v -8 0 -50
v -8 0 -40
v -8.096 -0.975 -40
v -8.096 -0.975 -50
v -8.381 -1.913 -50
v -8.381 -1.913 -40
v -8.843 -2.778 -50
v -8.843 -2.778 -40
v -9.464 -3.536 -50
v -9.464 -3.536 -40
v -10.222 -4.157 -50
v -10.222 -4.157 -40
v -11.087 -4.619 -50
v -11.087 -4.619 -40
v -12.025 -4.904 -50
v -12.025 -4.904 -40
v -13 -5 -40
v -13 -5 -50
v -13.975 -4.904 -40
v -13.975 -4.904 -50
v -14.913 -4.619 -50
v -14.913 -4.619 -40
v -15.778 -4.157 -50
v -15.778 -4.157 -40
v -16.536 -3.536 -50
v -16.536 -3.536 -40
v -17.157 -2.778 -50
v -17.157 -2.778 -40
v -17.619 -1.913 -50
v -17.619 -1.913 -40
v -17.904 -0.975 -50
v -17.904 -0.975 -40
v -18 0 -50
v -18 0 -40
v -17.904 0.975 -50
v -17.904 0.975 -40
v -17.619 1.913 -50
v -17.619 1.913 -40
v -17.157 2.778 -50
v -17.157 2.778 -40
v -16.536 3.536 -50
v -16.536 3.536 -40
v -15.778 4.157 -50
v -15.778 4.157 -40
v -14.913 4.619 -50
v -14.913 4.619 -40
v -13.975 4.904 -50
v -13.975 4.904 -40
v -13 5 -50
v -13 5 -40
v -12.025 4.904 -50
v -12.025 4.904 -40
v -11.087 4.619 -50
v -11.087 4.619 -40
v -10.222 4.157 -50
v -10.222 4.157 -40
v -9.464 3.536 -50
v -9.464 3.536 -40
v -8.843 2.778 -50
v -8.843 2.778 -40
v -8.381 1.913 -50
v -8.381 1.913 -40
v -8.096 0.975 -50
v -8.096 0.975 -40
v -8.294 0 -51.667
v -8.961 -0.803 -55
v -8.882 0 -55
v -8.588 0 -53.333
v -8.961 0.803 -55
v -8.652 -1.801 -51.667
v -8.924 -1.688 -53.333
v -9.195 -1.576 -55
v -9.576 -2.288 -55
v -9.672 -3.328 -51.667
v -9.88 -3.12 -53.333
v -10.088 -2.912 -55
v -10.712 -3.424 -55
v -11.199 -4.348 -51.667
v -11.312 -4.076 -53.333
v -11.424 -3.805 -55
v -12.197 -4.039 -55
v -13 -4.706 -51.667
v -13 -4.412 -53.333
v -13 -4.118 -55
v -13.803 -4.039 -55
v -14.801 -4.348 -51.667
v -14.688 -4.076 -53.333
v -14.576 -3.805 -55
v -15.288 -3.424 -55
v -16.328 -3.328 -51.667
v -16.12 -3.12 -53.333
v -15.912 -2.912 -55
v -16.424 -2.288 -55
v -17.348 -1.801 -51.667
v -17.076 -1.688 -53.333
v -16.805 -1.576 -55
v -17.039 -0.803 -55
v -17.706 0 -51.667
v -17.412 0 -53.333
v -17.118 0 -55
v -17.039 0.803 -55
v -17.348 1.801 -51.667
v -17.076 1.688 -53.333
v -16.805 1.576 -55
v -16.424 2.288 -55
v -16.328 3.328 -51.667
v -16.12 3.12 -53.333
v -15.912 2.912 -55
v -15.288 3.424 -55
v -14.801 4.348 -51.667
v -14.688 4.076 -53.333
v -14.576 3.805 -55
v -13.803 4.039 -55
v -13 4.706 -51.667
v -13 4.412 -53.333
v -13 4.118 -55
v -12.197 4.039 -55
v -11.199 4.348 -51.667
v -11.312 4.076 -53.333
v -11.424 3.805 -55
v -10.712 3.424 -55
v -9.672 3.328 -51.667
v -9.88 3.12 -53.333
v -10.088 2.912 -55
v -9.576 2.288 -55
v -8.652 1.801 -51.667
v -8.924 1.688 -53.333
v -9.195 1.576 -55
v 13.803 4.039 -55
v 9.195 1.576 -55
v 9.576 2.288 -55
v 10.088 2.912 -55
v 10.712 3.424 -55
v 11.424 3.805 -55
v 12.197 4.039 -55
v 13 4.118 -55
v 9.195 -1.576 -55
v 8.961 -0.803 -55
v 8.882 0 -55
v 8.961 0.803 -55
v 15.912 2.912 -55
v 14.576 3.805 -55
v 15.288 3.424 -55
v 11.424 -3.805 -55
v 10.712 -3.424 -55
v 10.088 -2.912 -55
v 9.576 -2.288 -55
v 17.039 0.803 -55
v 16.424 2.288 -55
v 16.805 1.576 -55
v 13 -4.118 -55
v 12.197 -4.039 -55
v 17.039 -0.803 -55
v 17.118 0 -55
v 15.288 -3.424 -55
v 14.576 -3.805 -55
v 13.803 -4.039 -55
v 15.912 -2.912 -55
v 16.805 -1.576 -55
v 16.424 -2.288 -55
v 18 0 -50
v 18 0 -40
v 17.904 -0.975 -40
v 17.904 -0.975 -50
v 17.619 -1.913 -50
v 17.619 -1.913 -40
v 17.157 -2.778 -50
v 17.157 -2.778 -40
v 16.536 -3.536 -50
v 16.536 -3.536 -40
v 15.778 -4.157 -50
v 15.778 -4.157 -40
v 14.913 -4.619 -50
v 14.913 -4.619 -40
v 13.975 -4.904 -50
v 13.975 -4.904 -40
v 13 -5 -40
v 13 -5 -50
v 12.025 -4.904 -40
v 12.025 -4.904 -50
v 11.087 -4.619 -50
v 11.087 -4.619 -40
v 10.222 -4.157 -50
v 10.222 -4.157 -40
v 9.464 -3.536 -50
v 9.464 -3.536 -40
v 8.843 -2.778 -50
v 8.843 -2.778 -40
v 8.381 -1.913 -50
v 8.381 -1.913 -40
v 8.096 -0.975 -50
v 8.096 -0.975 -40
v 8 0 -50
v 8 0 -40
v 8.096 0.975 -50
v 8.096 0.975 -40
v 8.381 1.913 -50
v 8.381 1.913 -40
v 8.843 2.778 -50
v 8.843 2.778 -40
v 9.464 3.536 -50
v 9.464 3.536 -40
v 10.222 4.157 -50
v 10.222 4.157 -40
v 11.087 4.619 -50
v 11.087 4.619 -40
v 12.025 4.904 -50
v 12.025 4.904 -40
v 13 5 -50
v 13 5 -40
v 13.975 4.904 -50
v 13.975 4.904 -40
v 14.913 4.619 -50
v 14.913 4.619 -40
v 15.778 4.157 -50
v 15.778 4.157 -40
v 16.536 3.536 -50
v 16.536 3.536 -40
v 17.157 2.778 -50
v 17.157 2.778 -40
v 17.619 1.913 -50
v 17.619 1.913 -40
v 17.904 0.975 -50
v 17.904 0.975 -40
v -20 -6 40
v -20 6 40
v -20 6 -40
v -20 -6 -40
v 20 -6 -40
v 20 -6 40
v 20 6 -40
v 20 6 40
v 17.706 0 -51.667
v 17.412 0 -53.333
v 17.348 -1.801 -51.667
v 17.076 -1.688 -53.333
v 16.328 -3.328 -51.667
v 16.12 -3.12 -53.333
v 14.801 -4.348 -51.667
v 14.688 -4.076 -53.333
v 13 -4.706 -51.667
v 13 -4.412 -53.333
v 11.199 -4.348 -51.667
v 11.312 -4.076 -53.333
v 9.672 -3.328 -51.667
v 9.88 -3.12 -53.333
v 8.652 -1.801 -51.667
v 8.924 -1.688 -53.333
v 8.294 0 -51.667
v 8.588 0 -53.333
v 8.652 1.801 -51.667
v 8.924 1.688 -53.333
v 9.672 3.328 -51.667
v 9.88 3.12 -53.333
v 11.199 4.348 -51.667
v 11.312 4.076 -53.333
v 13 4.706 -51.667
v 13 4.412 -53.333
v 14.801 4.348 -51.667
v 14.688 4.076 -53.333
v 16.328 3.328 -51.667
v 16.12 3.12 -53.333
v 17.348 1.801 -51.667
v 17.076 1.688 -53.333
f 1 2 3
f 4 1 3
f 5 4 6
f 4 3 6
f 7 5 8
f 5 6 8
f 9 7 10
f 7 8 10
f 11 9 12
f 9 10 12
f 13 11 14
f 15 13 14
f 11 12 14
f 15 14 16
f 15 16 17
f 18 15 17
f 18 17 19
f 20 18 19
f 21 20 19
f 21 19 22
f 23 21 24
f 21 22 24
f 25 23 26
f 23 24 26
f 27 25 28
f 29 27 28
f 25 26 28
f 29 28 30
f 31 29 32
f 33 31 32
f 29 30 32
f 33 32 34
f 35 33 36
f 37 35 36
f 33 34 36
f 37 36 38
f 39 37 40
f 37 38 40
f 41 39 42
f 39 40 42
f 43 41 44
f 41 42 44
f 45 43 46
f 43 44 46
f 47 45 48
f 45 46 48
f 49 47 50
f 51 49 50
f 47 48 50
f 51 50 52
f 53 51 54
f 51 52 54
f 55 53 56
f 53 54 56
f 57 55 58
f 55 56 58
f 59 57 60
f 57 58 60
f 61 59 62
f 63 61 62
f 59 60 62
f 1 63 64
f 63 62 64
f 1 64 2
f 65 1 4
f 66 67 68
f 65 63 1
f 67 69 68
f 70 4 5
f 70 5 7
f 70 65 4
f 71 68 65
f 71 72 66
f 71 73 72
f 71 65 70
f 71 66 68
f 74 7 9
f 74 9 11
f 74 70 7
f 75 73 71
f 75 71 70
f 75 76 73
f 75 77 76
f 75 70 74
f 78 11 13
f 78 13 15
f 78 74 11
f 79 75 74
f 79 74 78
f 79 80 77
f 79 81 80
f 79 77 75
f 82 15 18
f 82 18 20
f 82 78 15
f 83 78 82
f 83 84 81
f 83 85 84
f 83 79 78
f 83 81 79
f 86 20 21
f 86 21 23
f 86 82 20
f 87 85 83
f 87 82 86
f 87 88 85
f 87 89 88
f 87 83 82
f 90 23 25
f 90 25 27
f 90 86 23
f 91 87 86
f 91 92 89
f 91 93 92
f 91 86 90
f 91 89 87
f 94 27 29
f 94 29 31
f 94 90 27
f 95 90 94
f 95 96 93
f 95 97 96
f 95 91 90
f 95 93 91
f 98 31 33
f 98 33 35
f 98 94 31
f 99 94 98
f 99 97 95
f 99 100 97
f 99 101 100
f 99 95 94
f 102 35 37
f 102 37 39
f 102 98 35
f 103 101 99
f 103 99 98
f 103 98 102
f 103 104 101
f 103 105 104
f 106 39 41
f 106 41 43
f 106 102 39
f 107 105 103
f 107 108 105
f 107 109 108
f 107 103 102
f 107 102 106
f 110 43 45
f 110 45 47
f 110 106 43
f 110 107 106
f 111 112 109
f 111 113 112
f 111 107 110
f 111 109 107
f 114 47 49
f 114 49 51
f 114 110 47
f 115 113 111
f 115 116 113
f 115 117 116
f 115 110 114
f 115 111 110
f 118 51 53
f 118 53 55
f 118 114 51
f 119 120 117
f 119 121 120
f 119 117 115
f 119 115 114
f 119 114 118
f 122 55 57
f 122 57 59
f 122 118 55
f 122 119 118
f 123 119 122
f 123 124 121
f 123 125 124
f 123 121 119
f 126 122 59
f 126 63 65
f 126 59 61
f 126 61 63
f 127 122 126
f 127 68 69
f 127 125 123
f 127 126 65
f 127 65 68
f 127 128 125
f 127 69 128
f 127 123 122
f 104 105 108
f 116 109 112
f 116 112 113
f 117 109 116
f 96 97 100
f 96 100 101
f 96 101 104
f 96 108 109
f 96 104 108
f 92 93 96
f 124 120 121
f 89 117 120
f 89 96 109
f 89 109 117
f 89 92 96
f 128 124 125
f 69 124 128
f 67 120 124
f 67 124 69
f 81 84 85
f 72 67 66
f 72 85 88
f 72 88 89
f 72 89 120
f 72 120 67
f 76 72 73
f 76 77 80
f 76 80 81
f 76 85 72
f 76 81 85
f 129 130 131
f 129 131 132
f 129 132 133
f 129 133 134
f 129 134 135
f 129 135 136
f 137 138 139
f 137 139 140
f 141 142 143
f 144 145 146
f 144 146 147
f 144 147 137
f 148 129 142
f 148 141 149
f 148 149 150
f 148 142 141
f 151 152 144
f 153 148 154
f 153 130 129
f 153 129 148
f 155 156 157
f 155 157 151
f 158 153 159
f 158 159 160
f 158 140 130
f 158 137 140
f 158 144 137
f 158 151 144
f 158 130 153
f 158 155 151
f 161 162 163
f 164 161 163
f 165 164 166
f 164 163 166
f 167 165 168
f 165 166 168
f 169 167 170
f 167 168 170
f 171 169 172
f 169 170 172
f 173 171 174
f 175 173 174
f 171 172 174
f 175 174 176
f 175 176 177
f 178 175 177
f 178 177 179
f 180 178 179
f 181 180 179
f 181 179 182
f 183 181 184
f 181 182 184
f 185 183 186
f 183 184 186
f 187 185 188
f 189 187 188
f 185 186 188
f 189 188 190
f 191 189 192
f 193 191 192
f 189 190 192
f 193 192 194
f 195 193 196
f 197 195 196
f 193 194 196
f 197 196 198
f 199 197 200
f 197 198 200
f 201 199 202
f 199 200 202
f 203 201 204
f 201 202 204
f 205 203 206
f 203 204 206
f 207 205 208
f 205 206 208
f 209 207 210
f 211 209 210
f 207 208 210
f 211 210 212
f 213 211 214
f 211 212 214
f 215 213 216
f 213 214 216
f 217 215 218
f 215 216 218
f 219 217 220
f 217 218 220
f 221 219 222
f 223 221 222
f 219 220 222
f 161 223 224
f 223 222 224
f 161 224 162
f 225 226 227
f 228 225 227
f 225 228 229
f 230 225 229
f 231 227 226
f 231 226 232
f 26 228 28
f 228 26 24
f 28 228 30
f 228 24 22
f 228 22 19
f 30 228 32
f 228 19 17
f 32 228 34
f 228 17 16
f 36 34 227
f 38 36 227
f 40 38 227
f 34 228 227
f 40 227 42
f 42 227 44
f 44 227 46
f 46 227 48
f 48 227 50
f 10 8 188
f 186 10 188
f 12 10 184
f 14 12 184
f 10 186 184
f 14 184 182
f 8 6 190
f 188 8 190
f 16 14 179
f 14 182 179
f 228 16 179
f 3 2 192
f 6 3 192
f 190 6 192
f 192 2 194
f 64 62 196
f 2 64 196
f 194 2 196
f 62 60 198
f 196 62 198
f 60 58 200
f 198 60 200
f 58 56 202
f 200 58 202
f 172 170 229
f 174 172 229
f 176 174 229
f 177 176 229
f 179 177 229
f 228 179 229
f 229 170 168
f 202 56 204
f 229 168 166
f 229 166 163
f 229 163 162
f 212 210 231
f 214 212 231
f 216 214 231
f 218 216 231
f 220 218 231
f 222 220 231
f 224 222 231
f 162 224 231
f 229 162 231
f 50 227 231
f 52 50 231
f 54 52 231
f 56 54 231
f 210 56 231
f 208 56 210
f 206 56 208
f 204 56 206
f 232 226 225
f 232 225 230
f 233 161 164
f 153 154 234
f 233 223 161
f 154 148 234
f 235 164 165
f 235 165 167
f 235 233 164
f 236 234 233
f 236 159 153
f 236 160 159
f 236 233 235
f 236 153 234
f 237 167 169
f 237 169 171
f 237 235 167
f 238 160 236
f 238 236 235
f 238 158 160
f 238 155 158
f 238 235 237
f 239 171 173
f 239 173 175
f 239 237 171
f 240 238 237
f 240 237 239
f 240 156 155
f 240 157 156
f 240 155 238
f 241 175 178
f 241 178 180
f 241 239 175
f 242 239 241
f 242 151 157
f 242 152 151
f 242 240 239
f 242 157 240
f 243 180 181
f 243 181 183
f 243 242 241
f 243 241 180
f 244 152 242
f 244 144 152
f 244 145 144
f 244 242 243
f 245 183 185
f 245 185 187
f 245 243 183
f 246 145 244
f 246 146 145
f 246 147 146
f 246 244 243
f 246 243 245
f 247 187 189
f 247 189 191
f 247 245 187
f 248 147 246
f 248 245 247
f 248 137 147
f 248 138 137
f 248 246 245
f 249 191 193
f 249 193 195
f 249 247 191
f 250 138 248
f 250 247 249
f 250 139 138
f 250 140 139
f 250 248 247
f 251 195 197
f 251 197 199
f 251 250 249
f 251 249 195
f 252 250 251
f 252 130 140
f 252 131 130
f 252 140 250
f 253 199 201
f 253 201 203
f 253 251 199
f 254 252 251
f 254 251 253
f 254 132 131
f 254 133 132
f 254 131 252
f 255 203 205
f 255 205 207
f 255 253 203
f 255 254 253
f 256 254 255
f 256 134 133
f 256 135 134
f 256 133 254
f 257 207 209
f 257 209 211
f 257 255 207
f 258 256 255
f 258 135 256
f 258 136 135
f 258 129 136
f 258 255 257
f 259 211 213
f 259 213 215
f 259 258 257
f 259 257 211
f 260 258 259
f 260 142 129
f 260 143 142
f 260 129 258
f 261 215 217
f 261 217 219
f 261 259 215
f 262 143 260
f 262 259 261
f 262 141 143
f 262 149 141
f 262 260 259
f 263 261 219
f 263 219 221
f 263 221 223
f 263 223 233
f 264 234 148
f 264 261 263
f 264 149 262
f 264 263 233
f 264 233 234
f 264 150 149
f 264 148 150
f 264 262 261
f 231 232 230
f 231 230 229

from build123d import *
from OCP.BRepFilletAPI import BRepFilletAPI_MakeChamfer

# Parameters (mm, degrees)
SKETCH1_W           = 40
SKETCH1_H           = 80
BOSS_EXTRUDE1_DEPTH = 6
SKETCH2_R           = 5
BOSS_EXTRUDE2_DEPTH = 15
CHAMFER1_SIZE       = 5
CHAMFER1_SIZE2      = 0.881634904


with BuildPart() as part:
    # Sketch1 → Boss-Extrude1 (new, symmetric)
    with BuildSketch(Plane(origin=(0, 0, 0), x_dir=(1, 0, 0), z_dir=(0, 1, 0))):
        Rectangle(SKETCH1_W, SKETCH1_H)
    extrude(amount=BOSS_EXTRUDE1_DEPTH, both=True)

    # Sketch2 → Boss-Extrude2 (add)
    with BuildSketch(Plane(origin=(0, 0, -40), x_dir=(-1, 0, 0), z_dir=(0, 0, -1))):
        with Locations(Location((13, 0, 0), (0, 0, 180))):
            Circle(SKETCH2_R)
        with Locations(Location((-13, 0, 0), (0, 0, 180))):
            Circle(SKETCH2_R)
    extrude(amount=BOSS_EXTRUDE2_DEPTH)

    # Chamfer1: one chamfer whose edges measure the first distance from different faces: ONE call of the kernel's chamfer builder (chamfer() names one face for all edges)
    chamfer1_edges_1 = [part.edges().sort_by_distance(p)[0] for p in [
        (-18, 0, -55),
    ]]
    chamfer1_side_1 = [part.faces().sort_by_distance(p)[0] for p in [
        (-18, 0, -47.5),
    ]]
    chamfer1_edges_2 = [part.edges().sort_by_distance(p)[0] for p in [
        (8, 0, -55),
    ]]
    chamfer1_side_2 = [part.faces().sort_by_distance(p)[0] for p in [
        (8, 0, -47.5),
    ]]
    chamfer1 = BRepFilletAPI_MakeChamfer(part.part.solid().wrapped)
    for e in chamfer1_edges_1:
        chamfer1.Add(CHAMFER1_SIZE, CHAMFER1_SIZE2, e.wrapped, chamfer1_side_1[0].wrapped)  # the first distance lies on this face
    for e in chamfer1_edges_2:
        chamfer1.Add(CHAMFER1_SIZE, CHAMFER1_SIZE2, e.wrapped, chamfer1_side_2[0].wrapped)  # the first distance lies on this face
    add(Compound.cast(chamfer1.Shape()), mode=Mode.REPLACE)


solid = part.part
